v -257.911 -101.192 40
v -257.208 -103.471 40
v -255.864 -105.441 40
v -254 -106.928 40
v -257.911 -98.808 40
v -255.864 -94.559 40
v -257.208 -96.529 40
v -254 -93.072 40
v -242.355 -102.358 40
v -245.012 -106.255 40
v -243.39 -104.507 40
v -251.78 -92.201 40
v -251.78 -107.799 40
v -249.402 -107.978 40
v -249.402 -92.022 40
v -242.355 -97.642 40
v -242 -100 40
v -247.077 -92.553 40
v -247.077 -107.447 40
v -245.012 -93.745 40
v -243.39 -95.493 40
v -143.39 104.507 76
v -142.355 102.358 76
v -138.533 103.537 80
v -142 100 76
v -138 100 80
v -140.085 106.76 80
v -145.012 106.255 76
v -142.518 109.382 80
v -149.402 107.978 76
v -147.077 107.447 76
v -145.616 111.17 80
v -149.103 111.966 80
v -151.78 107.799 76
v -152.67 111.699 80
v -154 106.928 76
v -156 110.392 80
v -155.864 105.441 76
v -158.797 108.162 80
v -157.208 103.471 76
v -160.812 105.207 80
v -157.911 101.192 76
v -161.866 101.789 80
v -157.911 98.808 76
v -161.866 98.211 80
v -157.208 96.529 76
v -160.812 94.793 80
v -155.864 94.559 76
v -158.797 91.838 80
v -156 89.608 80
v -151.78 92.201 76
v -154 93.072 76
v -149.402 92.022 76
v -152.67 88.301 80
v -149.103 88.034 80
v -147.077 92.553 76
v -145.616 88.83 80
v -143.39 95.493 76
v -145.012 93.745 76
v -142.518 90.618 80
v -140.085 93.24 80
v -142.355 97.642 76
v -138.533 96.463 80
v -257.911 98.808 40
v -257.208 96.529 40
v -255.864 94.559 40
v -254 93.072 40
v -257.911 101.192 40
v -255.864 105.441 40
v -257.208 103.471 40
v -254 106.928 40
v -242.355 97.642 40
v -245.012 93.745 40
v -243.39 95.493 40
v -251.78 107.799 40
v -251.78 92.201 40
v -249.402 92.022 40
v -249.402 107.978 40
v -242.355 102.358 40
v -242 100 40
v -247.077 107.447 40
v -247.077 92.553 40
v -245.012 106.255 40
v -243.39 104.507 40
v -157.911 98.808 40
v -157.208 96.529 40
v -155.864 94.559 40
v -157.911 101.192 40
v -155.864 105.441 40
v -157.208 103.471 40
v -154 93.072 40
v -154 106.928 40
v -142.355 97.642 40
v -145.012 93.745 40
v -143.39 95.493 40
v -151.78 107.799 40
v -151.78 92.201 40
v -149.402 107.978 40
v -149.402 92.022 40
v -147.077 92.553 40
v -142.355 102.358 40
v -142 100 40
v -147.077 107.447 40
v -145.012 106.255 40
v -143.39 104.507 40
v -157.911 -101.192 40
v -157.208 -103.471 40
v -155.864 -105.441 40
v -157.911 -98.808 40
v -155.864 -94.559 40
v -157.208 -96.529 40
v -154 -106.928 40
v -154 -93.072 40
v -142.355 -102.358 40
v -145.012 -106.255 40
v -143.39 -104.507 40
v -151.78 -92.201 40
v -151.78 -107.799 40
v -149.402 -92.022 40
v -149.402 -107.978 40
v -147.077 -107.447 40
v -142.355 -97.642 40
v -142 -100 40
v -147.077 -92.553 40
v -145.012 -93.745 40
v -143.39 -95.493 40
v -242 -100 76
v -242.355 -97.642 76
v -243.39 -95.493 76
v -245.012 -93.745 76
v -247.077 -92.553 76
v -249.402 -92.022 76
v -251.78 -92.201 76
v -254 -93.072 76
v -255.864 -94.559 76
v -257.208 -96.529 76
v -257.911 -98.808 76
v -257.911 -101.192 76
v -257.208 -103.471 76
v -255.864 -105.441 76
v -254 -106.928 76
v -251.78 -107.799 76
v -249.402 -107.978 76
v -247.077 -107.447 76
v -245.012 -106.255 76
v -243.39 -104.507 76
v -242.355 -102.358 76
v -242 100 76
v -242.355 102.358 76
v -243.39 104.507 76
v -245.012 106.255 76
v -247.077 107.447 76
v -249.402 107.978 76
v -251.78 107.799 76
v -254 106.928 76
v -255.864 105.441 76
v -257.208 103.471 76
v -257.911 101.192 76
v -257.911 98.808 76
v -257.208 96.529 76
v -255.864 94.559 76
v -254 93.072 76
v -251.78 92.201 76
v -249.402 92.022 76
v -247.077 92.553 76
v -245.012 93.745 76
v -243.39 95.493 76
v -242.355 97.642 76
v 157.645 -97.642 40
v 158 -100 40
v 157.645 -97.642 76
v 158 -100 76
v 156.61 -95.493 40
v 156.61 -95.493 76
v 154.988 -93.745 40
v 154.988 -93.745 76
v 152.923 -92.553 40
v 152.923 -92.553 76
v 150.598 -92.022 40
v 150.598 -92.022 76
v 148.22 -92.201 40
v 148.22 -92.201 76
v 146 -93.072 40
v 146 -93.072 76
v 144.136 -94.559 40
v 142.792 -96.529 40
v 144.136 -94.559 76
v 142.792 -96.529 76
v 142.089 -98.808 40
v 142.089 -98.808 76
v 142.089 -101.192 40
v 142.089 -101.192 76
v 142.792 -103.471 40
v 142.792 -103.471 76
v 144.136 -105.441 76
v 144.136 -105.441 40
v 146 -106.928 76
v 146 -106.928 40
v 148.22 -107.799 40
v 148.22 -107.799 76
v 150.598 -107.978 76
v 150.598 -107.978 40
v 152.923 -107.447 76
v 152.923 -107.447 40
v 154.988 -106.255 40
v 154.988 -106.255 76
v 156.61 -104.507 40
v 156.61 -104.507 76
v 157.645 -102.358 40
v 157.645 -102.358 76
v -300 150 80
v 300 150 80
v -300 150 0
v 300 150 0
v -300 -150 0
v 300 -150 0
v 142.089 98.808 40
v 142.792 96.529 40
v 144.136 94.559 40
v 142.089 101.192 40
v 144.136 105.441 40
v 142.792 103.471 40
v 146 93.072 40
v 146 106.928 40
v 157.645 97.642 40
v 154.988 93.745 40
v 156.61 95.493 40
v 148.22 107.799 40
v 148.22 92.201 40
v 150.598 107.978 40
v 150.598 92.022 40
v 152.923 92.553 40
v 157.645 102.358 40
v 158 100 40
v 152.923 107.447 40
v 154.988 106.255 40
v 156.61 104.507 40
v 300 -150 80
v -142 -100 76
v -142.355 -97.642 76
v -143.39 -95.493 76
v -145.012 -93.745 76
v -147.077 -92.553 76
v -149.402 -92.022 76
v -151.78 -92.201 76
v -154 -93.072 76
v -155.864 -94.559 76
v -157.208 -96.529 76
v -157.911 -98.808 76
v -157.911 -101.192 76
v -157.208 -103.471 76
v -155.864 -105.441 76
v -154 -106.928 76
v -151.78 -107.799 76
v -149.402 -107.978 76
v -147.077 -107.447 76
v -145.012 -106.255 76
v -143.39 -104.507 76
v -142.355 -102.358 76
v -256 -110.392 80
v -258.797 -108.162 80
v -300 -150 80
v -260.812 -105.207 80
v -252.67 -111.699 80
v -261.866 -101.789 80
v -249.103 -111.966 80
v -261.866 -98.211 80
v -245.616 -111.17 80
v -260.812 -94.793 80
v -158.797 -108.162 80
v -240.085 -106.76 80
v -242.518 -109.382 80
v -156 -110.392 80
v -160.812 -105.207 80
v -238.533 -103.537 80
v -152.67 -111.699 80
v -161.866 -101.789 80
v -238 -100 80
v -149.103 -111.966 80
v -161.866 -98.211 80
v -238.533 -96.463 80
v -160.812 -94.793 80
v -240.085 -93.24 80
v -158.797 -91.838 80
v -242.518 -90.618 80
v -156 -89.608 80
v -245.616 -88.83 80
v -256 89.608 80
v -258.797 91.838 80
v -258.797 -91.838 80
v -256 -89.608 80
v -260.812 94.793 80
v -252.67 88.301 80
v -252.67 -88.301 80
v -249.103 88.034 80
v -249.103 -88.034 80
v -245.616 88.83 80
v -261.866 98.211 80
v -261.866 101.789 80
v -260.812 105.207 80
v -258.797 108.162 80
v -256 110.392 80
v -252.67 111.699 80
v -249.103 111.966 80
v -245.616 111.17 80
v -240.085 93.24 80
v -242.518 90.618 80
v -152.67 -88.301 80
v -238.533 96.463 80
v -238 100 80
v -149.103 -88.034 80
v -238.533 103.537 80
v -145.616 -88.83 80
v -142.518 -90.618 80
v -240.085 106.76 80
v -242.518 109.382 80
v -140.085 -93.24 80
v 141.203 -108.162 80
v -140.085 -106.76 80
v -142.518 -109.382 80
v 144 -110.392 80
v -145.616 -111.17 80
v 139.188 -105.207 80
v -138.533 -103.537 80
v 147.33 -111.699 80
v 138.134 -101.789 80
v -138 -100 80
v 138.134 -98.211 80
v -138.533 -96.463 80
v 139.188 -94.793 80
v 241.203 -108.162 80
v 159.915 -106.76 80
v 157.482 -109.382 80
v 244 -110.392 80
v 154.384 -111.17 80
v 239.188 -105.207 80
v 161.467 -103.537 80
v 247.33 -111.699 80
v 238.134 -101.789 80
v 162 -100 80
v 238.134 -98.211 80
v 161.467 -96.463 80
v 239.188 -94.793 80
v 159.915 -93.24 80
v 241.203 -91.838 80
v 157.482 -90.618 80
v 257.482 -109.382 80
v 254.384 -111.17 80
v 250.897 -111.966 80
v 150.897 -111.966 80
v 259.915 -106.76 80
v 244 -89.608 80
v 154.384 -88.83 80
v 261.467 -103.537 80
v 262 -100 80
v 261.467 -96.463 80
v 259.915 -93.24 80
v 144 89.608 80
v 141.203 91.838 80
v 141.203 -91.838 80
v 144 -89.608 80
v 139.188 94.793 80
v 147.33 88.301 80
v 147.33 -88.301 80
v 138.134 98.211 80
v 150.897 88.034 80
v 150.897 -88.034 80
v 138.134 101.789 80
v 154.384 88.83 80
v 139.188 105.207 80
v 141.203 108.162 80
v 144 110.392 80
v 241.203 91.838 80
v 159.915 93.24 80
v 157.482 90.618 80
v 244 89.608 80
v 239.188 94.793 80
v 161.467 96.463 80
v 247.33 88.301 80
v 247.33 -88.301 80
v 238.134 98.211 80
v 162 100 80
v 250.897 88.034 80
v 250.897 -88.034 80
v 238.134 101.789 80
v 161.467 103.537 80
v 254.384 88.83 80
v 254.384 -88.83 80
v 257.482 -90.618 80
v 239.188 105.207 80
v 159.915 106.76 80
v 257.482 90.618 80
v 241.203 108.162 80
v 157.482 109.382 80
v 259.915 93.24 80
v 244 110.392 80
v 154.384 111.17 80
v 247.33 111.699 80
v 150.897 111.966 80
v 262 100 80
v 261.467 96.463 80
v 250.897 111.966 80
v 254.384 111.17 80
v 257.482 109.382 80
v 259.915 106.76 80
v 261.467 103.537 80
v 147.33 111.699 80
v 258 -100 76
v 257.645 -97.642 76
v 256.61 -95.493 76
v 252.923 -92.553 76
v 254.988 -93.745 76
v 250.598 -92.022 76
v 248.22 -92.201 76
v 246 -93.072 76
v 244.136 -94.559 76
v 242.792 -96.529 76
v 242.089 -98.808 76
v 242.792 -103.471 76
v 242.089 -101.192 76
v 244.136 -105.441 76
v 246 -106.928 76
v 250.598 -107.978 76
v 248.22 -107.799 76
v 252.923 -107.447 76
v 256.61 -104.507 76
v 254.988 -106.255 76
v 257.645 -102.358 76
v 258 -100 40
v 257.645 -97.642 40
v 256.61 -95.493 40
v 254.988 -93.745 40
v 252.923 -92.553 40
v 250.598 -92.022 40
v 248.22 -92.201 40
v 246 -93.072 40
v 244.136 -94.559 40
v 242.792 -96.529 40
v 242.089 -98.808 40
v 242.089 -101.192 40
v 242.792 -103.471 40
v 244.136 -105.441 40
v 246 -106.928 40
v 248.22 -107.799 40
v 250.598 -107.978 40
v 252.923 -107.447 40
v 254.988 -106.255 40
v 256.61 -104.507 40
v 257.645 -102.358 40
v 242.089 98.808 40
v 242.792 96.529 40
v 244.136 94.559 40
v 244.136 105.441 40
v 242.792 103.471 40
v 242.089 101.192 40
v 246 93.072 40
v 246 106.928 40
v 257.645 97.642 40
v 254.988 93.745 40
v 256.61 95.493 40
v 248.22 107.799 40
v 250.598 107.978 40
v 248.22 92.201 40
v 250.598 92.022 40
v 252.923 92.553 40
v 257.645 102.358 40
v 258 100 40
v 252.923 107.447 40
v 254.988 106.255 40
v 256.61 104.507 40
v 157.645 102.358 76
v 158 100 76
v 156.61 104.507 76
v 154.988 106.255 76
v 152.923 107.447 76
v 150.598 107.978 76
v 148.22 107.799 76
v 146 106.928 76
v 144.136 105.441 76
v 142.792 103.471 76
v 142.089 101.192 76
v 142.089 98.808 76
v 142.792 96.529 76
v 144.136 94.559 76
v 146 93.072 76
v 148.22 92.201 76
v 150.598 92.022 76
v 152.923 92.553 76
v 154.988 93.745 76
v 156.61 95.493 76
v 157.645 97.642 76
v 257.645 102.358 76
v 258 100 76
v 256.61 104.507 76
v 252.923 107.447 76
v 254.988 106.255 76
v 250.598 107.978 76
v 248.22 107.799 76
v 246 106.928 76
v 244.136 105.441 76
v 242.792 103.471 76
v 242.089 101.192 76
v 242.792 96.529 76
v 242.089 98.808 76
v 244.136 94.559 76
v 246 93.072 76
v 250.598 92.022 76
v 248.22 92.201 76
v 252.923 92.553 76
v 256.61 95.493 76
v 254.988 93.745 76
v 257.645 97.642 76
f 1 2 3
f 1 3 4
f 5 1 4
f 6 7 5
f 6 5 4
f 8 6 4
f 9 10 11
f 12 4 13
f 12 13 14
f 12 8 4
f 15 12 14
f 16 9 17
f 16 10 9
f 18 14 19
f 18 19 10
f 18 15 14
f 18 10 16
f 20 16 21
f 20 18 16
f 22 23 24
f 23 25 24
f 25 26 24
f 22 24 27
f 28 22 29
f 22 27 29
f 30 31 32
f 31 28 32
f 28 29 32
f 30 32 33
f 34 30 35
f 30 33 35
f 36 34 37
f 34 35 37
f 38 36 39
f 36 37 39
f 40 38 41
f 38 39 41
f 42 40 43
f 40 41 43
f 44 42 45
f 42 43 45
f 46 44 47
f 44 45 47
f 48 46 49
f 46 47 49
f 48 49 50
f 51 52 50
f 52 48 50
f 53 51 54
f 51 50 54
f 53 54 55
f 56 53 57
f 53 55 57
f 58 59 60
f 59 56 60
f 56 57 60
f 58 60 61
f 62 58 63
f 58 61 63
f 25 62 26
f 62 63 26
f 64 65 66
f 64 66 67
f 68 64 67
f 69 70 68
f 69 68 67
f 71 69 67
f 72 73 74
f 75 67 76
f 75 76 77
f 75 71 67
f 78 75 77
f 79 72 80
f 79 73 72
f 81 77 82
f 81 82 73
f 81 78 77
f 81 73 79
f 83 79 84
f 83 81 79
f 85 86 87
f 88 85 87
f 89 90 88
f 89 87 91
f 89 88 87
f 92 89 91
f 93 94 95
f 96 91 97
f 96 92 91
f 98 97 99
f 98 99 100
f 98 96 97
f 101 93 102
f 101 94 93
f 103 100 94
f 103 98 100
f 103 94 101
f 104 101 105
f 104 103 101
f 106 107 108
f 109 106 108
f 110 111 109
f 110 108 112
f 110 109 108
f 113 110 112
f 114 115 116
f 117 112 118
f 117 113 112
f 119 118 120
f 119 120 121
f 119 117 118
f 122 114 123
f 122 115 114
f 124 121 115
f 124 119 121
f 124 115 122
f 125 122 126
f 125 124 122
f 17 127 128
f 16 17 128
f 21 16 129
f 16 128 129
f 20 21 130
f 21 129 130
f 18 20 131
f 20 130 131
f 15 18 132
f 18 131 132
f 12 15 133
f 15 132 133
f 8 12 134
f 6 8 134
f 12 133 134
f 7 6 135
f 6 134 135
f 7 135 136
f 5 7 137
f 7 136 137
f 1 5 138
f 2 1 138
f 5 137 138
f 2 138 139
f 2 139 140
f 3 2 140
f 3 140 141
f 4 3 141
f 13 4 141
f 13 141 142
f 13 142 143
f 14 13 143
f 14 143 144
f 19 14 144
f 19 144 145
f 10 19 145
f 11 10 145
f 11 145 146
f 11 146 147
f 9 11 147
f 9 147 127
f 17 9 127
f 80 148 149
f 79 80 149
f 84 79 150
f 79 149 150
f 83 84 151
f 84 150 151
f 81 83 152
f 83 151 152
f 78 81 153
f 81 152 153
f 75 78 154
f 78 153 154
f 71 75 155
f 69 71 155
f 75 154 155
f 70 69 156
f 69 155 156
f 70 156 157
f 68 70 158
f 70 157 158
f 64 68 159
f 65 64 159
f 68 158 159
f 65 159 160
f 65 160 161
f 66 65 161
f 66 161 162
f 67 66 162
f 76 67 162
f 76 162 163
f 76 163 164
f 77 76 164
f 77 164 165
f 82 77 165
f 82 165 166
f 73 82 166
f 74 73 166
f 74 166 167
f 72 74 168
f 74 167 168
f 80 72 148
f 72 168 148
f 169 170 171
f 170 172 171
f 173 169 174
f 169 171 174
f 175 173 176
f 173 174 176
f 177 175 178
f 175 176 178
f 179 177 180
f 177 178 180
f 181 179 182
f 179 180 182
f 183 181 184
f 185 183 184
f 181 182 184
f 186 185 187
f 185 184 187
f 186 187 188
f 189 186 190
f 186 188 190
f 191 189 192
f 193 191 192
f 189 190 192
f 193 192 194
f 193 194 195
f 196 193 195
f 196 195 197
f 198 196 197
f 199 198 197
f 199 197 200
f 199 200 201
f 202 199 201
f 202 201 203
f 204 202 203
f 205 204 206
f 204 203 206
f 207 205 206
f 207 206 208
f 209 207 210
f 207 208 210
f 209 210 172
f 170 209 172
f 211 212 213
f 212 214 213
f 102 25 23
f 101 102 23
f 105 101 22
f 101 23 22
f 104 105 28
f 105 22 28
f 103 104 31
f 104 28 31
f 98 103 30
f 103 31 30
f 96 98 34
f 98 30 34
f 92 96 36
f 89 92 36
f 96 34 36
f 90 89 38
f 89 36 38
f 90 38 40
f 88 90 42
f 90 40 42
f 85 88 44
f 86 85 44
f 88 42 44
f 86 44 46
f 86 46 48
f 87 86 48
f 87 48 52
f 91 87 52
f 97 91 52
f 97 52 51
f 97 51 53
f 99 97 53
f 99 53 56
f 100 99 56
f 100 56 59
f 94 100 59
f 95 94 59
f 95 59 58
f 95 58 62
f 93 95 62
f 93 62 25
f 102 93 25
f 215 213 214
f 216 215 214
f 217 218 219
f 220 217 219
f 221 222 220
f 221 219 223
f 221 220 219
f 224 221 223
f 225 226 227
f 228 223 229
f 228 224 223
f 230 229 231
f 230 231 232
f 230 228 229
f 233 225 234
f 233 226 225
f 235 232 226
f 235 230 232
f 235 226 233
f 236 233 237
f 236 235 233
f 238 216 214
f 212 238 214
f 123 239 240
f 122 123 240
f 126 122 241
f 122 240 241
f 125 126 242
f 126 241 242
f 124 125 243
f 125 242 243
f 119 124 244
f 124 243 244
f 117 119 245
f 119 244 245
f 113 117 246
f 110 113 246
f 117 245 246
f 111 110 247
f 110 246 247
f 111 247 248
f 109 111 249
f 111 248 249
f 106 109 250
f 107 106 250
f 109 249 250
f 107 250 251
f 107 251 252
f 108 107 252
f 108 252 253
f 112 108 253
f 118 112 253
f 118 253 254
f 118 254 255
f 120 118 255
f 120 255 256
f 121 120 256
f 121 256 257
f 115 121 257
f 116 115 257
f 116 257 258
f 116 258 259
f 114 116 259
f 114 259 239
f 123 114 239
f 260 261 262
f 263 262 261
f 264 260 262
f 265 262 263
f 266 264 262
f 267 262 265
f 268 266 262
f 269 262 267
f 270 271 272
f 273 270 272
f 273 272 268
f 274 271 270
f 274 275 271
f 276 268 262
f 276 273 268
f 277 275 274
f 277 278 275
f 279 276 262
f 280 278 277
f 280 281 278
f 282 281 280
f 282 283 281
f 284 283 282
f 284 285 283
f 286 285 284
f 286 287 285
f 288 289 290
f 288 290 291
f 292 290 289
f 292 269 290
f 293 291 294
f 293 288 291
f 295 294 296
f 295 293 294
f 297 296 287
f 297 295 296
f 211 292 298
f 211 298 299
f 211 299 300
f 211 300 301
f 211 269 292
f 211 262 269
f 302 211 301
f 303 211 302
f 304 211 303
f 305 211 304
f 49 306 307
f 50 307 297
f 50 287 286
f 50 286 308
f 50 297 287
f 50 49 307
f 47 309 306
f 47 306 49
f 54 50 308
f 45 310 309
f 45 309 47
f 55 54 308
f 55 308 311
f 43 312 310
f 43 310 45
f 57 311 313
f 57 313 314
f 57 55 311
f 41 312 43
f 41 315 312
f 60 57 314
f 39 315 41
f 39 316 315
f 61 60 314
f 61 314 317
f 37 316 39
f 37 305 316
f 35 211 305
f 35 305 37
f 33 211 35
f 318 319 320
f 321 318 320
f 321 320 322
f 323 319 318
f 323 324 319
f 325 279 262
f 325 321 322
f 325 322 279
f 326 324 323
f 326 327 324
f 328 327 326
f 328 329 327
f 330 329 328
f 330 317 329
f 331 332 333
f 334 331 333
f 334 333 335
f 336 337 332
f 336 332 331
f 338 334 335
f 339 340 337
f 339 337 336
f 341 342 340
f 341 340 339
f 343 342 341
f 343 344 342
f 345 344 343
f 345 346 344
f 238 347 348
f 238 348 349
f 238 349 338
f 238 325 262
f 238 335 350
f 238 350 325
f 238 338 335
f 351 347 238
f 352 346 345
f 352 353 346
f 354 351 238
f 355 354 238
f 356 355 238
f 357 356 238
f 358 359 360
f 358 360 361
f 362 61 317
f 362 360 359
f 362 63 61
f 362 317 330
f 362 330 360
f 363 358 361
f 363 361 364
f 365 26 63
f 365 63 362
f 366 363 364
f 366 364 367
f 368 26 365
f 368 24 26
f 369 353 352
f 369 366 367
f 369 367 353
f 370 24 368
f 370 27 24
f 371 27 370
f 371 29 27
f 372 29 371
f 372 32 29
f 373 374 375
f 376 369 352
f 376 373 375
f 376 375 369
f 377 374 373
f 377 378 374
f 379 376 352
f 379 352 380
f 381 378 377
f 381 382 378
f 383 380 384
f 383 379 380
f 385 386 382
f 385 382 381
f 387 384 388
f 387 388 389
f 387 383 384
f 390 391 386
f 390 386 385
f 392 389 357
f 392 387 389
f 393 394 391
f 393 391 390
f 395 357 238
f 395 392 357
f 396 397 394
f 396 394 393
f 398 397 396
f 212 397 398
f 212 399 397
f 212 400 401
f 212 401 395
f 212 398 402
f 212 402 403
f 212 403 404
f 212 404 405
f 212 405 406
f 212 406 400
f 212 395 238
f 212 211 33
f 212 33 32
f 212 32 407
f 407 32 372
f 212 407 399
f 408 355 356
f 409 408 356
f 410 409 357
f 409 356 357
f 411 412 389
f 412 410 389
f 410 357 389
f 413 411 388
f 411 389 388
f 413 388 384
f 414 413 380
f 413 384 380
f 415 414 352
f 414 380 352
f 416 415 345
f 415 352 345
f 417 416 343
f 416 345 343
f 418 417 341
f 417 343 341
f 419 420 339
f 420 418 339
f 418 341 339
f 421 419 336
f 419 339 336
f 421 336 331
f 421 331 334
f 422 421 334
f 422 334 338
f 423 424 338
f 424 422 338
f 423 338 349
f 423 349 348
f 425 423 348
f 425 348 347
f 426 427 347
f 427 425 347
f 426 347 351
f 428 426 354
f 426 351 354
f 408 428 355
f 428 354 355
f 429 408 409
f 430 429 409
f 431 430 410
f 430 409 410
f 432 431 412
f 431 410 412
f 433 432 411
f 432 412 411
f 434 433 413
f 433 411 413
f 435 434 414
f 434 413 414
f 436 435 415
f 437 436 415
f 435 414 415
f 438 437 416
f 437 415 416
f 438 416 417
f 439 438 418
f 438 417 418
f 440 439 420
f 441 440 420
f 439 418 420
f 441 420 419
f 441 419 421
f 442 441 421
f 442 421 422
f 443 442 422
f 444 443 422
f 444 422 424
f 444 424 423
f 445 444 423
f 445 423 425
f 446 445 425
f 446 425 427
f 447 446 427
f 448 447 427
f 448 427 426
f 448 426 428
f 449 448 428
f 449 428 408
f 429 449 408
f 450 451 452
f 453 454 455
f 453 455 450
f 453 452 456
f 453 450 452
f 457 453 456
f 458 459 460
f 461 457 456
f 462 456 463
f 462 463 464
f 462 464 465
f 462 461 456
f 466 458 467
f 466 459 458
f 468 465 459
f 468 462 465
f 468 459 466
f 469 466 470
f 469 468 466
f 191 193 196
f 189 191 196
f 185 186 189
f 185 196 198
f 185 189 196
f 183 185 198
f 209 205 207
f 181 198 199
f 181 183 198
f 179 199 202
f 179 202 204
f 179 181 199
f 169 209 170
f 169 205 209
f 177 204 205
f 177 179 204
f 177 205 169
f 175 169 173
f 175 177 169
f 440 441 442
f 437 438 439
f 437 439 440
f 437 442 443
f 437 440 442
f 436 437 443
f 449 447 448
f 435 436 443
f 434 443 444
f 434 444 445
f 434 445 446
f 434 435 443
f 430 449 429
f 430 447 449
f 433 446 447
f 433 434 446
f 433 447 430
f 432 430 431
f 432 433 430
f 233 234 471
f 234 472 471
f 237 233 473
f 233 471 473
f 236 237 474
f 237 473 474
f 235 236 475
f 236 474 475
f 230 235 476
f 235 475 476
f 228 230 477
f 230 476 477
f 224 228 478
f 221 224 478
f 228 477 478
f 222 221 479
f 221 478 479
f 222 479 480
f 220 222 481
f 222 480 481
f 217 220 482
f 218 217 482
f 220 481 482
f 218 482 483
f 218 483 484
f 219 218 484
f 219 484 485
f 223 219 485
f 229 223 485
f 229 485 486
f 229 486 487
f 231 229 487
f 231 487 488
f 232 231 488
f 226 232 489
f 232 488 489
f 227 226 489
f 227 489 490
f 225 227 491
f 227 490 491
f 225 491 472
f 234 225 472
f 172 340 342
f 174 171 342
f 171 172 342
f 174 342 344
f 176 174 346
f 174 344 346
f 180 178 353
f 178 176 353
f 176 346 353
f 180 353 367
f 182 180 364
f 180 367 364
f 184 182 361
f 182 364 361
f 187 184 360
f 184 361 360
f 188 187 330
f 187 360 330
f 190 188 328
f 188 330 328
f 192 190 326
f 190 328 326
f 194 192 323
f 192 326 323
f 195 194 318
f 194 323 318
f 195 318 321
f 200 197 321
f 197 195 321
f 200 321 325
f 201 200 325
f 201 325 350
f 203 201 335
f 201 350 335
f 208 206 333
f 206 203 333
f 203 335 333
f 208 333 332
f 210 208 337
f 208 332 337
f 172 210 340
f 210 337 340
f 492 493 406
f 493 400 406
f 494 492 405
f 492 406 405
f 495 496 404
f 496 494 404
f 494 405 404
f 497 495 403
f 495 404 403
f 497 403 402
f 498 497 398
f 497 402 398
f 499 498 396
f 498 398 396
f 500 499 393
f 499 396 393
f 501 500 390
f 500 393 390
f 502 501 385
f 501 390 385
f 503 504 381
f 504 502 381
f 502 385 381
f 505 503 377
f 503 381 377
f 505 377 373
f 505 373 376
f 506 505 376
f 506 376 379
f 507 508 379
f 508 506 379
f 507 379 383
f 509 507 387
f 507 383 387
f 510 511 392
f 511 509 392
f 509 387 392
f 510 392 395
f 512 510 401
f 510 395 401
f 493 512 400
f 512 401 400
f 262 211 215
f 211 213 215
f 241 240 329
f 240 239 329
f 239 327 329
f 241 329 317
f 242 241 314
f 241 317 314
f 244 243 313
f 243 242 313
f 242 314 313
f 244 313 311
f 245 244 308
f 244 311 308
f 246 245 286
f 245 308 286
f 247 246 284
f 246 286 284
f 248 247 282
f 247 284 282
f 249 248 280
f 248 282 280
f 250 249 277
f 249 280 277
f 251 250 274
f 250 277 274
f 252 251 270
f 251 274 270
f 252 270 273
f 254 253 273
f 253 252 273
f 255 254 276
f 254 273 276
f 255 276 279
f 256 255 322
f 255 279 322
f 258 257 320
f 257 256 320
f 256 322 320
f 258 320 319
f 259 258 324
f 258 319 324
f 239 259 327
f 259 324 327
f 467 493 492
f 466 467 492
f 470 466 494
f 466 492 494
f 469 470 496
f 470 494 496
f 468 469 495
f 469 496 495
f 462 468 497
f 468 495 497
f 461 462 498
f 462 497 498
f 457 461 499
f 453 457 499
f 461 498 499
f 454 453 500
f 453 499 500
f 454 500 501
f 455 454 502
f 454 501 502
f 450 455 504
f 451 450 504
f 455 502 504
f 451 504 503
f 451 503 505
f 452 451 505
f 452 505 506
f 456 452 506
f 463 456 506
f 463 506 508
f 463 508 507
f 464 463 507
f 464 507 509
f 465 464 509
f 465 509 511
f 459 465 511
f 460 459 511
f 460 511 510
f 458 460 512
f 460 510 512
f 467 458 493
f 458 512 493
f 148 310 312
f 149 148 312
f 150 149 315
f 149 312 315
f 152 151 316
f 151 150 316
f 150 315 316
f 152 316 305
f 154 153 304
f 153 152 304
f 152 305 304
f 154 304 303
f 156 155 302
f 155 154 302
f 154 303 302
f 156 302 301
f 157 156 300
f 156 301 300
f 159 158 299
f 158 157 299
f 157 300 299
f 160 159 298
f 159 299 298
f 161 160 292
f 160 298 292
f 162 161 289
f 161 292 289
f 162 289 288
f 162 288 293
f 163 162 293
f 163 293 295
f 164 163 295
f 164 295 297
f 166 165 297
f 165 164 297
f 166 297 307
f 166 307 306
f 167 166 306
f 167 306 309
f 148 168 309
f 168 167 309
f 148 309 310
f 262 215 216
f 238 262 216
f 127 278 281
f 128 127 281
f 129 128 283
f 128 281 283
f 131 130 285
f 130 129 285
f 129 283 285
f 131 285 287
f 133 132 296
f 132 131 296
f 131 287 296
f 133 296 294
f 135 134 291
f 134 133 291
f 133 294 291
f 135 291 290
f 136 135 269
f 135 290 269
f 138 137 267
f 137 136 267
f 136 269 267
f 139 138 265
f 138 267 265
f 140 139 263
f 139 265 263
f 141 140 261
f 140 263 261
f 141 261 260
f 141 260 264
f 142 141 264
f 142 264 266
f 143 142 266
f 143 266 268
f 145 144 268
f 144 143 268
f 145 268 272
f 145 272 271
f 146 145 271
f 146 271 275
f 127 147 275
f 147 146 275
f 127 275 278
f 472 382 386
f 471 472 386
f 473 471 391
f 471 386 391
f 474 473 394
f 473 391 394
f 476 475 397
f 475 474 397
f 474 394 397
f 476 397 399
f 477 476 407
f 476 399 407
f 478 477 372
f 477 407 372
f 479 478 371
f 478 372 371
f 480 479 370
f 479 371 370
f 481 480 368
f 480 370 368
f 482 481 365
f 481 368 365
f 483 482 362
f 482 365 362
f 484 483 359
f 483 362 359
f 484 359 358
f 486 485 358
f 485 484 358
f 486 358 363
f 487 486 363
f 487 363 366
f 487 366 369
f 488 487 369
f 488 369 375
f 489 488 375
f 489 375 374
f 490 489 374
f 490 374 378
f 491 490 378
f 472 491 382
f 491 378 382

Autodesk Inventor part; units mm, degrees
ref_plane "YZ Plane" through (0, 0, 0) normal (1, 0, 0) x (0, 1, 0)
ref_plane "XZ Plane" through (0, 0, 0) normal (0, 1, 0) x (-1, 0, 0)
ref_plane "XY Plane" through (0, 0, 0) normal (0, 0, 1) x (1, 0, 0)
sketch "Esboço1" plane through (0, 0, 0) normal (0, 0, 1) x (1, 0, 0)
  line L0 (-300, -150) -> (300, -150)
  line L1 (300, -150) -> (300, 150)
  line L2 (300, 150) -> (-300, 150)
  line L3 (-300, 150) -> (-300, -150)
  line L4 (-300, -150) -> (300, 150) construction
  line L5 (300, -150) -> (-300, 150) construction
  point P0 (0, 0)
  dimension "d0" = 600
  dimension "d1" = 300
extrude "Extrusão1" add sketch "Esboço1" along normal blind 80
sketch "Esboço2" plane through (0, 0, 80) normal (0, 0, 1) x (1, 0, 0)
  line L0 (-250, -100) -> (250, -100)
  line L1 (250, -100) -> (250, 100)
  line L2 (250, 100) -> (-250, 100)
  line L3 (-250, 100) -> (-250, -100)
  line L4 (-250, -100) -> (250, 100) construction
  line L5 (250, -100) -> (-250, 100) construction
  line L6 (-150, -100) -> (150, -100)
  line L7 (150, -100) -> (150, 100)
  line L8 (150, 100) -> (-150, 100)
  line L9 (-150, 100) -> (-150, -100)
  line L10 (-150, -100) -> (150, 100) construction
  line L11 (150, -100) -> (-150, 100) construction
  circle A0 centre (-250, 100) radius 8
  circle A1 centre (-150, 100) radius 8
  circle A2 centre (150, 100) radius 8
  circle A3 centre (250, 100) radius 8
  circle A4 centre (250, -100) radius 8
  circle A5 centre (150, -100) radius 8
  circle A6 centre (-150, -100) radius 8
  circle A7 centre (-250, -100) radius 8
  point P0 (0, 0)
  dimension "d4" = 500
  dimension "d5" = 200
  dimension "d6" = 300
  dimension "d7" = 16
  dimension "d8" = 16
  dimension "d9" = 16
  dimension "d10" = 16
  dimension "d11" = 16
  dimension "d12" = 16
  dimension "d13" = 16
  dimension "d14" = 16
extrude "Extrusão2" cut sketch "Esboço2" against normal blind 40 contours L3 A7 L0 | L0 A7 L3 | A6 L9 L0 | L0 A6 | A0 L2 L3 | L3 L2 A0 | L9 A6 L0 | A1 L2 L9 | L9 L2 A1 | A5 L7 L0 | L0 A5 | A1 L2 | L7 A5 L0 | A2 L2 | L2 L7 A2 | L7 L2 A2 | A4 L1 L0 | L0 L1 A4 | A3 L1 L2 | L2 L1 A3
chamfer "Chanfro1" distance 4 angle 45 8 edges at (-258, 100, 80) (-158, 100, 80) (-258, -100, 80) (-158, -100, 80) (142, 100, 80) (142, -100, 80) (242, 100, 80) (242, -100, 80)
properties part number "suporte topo"
